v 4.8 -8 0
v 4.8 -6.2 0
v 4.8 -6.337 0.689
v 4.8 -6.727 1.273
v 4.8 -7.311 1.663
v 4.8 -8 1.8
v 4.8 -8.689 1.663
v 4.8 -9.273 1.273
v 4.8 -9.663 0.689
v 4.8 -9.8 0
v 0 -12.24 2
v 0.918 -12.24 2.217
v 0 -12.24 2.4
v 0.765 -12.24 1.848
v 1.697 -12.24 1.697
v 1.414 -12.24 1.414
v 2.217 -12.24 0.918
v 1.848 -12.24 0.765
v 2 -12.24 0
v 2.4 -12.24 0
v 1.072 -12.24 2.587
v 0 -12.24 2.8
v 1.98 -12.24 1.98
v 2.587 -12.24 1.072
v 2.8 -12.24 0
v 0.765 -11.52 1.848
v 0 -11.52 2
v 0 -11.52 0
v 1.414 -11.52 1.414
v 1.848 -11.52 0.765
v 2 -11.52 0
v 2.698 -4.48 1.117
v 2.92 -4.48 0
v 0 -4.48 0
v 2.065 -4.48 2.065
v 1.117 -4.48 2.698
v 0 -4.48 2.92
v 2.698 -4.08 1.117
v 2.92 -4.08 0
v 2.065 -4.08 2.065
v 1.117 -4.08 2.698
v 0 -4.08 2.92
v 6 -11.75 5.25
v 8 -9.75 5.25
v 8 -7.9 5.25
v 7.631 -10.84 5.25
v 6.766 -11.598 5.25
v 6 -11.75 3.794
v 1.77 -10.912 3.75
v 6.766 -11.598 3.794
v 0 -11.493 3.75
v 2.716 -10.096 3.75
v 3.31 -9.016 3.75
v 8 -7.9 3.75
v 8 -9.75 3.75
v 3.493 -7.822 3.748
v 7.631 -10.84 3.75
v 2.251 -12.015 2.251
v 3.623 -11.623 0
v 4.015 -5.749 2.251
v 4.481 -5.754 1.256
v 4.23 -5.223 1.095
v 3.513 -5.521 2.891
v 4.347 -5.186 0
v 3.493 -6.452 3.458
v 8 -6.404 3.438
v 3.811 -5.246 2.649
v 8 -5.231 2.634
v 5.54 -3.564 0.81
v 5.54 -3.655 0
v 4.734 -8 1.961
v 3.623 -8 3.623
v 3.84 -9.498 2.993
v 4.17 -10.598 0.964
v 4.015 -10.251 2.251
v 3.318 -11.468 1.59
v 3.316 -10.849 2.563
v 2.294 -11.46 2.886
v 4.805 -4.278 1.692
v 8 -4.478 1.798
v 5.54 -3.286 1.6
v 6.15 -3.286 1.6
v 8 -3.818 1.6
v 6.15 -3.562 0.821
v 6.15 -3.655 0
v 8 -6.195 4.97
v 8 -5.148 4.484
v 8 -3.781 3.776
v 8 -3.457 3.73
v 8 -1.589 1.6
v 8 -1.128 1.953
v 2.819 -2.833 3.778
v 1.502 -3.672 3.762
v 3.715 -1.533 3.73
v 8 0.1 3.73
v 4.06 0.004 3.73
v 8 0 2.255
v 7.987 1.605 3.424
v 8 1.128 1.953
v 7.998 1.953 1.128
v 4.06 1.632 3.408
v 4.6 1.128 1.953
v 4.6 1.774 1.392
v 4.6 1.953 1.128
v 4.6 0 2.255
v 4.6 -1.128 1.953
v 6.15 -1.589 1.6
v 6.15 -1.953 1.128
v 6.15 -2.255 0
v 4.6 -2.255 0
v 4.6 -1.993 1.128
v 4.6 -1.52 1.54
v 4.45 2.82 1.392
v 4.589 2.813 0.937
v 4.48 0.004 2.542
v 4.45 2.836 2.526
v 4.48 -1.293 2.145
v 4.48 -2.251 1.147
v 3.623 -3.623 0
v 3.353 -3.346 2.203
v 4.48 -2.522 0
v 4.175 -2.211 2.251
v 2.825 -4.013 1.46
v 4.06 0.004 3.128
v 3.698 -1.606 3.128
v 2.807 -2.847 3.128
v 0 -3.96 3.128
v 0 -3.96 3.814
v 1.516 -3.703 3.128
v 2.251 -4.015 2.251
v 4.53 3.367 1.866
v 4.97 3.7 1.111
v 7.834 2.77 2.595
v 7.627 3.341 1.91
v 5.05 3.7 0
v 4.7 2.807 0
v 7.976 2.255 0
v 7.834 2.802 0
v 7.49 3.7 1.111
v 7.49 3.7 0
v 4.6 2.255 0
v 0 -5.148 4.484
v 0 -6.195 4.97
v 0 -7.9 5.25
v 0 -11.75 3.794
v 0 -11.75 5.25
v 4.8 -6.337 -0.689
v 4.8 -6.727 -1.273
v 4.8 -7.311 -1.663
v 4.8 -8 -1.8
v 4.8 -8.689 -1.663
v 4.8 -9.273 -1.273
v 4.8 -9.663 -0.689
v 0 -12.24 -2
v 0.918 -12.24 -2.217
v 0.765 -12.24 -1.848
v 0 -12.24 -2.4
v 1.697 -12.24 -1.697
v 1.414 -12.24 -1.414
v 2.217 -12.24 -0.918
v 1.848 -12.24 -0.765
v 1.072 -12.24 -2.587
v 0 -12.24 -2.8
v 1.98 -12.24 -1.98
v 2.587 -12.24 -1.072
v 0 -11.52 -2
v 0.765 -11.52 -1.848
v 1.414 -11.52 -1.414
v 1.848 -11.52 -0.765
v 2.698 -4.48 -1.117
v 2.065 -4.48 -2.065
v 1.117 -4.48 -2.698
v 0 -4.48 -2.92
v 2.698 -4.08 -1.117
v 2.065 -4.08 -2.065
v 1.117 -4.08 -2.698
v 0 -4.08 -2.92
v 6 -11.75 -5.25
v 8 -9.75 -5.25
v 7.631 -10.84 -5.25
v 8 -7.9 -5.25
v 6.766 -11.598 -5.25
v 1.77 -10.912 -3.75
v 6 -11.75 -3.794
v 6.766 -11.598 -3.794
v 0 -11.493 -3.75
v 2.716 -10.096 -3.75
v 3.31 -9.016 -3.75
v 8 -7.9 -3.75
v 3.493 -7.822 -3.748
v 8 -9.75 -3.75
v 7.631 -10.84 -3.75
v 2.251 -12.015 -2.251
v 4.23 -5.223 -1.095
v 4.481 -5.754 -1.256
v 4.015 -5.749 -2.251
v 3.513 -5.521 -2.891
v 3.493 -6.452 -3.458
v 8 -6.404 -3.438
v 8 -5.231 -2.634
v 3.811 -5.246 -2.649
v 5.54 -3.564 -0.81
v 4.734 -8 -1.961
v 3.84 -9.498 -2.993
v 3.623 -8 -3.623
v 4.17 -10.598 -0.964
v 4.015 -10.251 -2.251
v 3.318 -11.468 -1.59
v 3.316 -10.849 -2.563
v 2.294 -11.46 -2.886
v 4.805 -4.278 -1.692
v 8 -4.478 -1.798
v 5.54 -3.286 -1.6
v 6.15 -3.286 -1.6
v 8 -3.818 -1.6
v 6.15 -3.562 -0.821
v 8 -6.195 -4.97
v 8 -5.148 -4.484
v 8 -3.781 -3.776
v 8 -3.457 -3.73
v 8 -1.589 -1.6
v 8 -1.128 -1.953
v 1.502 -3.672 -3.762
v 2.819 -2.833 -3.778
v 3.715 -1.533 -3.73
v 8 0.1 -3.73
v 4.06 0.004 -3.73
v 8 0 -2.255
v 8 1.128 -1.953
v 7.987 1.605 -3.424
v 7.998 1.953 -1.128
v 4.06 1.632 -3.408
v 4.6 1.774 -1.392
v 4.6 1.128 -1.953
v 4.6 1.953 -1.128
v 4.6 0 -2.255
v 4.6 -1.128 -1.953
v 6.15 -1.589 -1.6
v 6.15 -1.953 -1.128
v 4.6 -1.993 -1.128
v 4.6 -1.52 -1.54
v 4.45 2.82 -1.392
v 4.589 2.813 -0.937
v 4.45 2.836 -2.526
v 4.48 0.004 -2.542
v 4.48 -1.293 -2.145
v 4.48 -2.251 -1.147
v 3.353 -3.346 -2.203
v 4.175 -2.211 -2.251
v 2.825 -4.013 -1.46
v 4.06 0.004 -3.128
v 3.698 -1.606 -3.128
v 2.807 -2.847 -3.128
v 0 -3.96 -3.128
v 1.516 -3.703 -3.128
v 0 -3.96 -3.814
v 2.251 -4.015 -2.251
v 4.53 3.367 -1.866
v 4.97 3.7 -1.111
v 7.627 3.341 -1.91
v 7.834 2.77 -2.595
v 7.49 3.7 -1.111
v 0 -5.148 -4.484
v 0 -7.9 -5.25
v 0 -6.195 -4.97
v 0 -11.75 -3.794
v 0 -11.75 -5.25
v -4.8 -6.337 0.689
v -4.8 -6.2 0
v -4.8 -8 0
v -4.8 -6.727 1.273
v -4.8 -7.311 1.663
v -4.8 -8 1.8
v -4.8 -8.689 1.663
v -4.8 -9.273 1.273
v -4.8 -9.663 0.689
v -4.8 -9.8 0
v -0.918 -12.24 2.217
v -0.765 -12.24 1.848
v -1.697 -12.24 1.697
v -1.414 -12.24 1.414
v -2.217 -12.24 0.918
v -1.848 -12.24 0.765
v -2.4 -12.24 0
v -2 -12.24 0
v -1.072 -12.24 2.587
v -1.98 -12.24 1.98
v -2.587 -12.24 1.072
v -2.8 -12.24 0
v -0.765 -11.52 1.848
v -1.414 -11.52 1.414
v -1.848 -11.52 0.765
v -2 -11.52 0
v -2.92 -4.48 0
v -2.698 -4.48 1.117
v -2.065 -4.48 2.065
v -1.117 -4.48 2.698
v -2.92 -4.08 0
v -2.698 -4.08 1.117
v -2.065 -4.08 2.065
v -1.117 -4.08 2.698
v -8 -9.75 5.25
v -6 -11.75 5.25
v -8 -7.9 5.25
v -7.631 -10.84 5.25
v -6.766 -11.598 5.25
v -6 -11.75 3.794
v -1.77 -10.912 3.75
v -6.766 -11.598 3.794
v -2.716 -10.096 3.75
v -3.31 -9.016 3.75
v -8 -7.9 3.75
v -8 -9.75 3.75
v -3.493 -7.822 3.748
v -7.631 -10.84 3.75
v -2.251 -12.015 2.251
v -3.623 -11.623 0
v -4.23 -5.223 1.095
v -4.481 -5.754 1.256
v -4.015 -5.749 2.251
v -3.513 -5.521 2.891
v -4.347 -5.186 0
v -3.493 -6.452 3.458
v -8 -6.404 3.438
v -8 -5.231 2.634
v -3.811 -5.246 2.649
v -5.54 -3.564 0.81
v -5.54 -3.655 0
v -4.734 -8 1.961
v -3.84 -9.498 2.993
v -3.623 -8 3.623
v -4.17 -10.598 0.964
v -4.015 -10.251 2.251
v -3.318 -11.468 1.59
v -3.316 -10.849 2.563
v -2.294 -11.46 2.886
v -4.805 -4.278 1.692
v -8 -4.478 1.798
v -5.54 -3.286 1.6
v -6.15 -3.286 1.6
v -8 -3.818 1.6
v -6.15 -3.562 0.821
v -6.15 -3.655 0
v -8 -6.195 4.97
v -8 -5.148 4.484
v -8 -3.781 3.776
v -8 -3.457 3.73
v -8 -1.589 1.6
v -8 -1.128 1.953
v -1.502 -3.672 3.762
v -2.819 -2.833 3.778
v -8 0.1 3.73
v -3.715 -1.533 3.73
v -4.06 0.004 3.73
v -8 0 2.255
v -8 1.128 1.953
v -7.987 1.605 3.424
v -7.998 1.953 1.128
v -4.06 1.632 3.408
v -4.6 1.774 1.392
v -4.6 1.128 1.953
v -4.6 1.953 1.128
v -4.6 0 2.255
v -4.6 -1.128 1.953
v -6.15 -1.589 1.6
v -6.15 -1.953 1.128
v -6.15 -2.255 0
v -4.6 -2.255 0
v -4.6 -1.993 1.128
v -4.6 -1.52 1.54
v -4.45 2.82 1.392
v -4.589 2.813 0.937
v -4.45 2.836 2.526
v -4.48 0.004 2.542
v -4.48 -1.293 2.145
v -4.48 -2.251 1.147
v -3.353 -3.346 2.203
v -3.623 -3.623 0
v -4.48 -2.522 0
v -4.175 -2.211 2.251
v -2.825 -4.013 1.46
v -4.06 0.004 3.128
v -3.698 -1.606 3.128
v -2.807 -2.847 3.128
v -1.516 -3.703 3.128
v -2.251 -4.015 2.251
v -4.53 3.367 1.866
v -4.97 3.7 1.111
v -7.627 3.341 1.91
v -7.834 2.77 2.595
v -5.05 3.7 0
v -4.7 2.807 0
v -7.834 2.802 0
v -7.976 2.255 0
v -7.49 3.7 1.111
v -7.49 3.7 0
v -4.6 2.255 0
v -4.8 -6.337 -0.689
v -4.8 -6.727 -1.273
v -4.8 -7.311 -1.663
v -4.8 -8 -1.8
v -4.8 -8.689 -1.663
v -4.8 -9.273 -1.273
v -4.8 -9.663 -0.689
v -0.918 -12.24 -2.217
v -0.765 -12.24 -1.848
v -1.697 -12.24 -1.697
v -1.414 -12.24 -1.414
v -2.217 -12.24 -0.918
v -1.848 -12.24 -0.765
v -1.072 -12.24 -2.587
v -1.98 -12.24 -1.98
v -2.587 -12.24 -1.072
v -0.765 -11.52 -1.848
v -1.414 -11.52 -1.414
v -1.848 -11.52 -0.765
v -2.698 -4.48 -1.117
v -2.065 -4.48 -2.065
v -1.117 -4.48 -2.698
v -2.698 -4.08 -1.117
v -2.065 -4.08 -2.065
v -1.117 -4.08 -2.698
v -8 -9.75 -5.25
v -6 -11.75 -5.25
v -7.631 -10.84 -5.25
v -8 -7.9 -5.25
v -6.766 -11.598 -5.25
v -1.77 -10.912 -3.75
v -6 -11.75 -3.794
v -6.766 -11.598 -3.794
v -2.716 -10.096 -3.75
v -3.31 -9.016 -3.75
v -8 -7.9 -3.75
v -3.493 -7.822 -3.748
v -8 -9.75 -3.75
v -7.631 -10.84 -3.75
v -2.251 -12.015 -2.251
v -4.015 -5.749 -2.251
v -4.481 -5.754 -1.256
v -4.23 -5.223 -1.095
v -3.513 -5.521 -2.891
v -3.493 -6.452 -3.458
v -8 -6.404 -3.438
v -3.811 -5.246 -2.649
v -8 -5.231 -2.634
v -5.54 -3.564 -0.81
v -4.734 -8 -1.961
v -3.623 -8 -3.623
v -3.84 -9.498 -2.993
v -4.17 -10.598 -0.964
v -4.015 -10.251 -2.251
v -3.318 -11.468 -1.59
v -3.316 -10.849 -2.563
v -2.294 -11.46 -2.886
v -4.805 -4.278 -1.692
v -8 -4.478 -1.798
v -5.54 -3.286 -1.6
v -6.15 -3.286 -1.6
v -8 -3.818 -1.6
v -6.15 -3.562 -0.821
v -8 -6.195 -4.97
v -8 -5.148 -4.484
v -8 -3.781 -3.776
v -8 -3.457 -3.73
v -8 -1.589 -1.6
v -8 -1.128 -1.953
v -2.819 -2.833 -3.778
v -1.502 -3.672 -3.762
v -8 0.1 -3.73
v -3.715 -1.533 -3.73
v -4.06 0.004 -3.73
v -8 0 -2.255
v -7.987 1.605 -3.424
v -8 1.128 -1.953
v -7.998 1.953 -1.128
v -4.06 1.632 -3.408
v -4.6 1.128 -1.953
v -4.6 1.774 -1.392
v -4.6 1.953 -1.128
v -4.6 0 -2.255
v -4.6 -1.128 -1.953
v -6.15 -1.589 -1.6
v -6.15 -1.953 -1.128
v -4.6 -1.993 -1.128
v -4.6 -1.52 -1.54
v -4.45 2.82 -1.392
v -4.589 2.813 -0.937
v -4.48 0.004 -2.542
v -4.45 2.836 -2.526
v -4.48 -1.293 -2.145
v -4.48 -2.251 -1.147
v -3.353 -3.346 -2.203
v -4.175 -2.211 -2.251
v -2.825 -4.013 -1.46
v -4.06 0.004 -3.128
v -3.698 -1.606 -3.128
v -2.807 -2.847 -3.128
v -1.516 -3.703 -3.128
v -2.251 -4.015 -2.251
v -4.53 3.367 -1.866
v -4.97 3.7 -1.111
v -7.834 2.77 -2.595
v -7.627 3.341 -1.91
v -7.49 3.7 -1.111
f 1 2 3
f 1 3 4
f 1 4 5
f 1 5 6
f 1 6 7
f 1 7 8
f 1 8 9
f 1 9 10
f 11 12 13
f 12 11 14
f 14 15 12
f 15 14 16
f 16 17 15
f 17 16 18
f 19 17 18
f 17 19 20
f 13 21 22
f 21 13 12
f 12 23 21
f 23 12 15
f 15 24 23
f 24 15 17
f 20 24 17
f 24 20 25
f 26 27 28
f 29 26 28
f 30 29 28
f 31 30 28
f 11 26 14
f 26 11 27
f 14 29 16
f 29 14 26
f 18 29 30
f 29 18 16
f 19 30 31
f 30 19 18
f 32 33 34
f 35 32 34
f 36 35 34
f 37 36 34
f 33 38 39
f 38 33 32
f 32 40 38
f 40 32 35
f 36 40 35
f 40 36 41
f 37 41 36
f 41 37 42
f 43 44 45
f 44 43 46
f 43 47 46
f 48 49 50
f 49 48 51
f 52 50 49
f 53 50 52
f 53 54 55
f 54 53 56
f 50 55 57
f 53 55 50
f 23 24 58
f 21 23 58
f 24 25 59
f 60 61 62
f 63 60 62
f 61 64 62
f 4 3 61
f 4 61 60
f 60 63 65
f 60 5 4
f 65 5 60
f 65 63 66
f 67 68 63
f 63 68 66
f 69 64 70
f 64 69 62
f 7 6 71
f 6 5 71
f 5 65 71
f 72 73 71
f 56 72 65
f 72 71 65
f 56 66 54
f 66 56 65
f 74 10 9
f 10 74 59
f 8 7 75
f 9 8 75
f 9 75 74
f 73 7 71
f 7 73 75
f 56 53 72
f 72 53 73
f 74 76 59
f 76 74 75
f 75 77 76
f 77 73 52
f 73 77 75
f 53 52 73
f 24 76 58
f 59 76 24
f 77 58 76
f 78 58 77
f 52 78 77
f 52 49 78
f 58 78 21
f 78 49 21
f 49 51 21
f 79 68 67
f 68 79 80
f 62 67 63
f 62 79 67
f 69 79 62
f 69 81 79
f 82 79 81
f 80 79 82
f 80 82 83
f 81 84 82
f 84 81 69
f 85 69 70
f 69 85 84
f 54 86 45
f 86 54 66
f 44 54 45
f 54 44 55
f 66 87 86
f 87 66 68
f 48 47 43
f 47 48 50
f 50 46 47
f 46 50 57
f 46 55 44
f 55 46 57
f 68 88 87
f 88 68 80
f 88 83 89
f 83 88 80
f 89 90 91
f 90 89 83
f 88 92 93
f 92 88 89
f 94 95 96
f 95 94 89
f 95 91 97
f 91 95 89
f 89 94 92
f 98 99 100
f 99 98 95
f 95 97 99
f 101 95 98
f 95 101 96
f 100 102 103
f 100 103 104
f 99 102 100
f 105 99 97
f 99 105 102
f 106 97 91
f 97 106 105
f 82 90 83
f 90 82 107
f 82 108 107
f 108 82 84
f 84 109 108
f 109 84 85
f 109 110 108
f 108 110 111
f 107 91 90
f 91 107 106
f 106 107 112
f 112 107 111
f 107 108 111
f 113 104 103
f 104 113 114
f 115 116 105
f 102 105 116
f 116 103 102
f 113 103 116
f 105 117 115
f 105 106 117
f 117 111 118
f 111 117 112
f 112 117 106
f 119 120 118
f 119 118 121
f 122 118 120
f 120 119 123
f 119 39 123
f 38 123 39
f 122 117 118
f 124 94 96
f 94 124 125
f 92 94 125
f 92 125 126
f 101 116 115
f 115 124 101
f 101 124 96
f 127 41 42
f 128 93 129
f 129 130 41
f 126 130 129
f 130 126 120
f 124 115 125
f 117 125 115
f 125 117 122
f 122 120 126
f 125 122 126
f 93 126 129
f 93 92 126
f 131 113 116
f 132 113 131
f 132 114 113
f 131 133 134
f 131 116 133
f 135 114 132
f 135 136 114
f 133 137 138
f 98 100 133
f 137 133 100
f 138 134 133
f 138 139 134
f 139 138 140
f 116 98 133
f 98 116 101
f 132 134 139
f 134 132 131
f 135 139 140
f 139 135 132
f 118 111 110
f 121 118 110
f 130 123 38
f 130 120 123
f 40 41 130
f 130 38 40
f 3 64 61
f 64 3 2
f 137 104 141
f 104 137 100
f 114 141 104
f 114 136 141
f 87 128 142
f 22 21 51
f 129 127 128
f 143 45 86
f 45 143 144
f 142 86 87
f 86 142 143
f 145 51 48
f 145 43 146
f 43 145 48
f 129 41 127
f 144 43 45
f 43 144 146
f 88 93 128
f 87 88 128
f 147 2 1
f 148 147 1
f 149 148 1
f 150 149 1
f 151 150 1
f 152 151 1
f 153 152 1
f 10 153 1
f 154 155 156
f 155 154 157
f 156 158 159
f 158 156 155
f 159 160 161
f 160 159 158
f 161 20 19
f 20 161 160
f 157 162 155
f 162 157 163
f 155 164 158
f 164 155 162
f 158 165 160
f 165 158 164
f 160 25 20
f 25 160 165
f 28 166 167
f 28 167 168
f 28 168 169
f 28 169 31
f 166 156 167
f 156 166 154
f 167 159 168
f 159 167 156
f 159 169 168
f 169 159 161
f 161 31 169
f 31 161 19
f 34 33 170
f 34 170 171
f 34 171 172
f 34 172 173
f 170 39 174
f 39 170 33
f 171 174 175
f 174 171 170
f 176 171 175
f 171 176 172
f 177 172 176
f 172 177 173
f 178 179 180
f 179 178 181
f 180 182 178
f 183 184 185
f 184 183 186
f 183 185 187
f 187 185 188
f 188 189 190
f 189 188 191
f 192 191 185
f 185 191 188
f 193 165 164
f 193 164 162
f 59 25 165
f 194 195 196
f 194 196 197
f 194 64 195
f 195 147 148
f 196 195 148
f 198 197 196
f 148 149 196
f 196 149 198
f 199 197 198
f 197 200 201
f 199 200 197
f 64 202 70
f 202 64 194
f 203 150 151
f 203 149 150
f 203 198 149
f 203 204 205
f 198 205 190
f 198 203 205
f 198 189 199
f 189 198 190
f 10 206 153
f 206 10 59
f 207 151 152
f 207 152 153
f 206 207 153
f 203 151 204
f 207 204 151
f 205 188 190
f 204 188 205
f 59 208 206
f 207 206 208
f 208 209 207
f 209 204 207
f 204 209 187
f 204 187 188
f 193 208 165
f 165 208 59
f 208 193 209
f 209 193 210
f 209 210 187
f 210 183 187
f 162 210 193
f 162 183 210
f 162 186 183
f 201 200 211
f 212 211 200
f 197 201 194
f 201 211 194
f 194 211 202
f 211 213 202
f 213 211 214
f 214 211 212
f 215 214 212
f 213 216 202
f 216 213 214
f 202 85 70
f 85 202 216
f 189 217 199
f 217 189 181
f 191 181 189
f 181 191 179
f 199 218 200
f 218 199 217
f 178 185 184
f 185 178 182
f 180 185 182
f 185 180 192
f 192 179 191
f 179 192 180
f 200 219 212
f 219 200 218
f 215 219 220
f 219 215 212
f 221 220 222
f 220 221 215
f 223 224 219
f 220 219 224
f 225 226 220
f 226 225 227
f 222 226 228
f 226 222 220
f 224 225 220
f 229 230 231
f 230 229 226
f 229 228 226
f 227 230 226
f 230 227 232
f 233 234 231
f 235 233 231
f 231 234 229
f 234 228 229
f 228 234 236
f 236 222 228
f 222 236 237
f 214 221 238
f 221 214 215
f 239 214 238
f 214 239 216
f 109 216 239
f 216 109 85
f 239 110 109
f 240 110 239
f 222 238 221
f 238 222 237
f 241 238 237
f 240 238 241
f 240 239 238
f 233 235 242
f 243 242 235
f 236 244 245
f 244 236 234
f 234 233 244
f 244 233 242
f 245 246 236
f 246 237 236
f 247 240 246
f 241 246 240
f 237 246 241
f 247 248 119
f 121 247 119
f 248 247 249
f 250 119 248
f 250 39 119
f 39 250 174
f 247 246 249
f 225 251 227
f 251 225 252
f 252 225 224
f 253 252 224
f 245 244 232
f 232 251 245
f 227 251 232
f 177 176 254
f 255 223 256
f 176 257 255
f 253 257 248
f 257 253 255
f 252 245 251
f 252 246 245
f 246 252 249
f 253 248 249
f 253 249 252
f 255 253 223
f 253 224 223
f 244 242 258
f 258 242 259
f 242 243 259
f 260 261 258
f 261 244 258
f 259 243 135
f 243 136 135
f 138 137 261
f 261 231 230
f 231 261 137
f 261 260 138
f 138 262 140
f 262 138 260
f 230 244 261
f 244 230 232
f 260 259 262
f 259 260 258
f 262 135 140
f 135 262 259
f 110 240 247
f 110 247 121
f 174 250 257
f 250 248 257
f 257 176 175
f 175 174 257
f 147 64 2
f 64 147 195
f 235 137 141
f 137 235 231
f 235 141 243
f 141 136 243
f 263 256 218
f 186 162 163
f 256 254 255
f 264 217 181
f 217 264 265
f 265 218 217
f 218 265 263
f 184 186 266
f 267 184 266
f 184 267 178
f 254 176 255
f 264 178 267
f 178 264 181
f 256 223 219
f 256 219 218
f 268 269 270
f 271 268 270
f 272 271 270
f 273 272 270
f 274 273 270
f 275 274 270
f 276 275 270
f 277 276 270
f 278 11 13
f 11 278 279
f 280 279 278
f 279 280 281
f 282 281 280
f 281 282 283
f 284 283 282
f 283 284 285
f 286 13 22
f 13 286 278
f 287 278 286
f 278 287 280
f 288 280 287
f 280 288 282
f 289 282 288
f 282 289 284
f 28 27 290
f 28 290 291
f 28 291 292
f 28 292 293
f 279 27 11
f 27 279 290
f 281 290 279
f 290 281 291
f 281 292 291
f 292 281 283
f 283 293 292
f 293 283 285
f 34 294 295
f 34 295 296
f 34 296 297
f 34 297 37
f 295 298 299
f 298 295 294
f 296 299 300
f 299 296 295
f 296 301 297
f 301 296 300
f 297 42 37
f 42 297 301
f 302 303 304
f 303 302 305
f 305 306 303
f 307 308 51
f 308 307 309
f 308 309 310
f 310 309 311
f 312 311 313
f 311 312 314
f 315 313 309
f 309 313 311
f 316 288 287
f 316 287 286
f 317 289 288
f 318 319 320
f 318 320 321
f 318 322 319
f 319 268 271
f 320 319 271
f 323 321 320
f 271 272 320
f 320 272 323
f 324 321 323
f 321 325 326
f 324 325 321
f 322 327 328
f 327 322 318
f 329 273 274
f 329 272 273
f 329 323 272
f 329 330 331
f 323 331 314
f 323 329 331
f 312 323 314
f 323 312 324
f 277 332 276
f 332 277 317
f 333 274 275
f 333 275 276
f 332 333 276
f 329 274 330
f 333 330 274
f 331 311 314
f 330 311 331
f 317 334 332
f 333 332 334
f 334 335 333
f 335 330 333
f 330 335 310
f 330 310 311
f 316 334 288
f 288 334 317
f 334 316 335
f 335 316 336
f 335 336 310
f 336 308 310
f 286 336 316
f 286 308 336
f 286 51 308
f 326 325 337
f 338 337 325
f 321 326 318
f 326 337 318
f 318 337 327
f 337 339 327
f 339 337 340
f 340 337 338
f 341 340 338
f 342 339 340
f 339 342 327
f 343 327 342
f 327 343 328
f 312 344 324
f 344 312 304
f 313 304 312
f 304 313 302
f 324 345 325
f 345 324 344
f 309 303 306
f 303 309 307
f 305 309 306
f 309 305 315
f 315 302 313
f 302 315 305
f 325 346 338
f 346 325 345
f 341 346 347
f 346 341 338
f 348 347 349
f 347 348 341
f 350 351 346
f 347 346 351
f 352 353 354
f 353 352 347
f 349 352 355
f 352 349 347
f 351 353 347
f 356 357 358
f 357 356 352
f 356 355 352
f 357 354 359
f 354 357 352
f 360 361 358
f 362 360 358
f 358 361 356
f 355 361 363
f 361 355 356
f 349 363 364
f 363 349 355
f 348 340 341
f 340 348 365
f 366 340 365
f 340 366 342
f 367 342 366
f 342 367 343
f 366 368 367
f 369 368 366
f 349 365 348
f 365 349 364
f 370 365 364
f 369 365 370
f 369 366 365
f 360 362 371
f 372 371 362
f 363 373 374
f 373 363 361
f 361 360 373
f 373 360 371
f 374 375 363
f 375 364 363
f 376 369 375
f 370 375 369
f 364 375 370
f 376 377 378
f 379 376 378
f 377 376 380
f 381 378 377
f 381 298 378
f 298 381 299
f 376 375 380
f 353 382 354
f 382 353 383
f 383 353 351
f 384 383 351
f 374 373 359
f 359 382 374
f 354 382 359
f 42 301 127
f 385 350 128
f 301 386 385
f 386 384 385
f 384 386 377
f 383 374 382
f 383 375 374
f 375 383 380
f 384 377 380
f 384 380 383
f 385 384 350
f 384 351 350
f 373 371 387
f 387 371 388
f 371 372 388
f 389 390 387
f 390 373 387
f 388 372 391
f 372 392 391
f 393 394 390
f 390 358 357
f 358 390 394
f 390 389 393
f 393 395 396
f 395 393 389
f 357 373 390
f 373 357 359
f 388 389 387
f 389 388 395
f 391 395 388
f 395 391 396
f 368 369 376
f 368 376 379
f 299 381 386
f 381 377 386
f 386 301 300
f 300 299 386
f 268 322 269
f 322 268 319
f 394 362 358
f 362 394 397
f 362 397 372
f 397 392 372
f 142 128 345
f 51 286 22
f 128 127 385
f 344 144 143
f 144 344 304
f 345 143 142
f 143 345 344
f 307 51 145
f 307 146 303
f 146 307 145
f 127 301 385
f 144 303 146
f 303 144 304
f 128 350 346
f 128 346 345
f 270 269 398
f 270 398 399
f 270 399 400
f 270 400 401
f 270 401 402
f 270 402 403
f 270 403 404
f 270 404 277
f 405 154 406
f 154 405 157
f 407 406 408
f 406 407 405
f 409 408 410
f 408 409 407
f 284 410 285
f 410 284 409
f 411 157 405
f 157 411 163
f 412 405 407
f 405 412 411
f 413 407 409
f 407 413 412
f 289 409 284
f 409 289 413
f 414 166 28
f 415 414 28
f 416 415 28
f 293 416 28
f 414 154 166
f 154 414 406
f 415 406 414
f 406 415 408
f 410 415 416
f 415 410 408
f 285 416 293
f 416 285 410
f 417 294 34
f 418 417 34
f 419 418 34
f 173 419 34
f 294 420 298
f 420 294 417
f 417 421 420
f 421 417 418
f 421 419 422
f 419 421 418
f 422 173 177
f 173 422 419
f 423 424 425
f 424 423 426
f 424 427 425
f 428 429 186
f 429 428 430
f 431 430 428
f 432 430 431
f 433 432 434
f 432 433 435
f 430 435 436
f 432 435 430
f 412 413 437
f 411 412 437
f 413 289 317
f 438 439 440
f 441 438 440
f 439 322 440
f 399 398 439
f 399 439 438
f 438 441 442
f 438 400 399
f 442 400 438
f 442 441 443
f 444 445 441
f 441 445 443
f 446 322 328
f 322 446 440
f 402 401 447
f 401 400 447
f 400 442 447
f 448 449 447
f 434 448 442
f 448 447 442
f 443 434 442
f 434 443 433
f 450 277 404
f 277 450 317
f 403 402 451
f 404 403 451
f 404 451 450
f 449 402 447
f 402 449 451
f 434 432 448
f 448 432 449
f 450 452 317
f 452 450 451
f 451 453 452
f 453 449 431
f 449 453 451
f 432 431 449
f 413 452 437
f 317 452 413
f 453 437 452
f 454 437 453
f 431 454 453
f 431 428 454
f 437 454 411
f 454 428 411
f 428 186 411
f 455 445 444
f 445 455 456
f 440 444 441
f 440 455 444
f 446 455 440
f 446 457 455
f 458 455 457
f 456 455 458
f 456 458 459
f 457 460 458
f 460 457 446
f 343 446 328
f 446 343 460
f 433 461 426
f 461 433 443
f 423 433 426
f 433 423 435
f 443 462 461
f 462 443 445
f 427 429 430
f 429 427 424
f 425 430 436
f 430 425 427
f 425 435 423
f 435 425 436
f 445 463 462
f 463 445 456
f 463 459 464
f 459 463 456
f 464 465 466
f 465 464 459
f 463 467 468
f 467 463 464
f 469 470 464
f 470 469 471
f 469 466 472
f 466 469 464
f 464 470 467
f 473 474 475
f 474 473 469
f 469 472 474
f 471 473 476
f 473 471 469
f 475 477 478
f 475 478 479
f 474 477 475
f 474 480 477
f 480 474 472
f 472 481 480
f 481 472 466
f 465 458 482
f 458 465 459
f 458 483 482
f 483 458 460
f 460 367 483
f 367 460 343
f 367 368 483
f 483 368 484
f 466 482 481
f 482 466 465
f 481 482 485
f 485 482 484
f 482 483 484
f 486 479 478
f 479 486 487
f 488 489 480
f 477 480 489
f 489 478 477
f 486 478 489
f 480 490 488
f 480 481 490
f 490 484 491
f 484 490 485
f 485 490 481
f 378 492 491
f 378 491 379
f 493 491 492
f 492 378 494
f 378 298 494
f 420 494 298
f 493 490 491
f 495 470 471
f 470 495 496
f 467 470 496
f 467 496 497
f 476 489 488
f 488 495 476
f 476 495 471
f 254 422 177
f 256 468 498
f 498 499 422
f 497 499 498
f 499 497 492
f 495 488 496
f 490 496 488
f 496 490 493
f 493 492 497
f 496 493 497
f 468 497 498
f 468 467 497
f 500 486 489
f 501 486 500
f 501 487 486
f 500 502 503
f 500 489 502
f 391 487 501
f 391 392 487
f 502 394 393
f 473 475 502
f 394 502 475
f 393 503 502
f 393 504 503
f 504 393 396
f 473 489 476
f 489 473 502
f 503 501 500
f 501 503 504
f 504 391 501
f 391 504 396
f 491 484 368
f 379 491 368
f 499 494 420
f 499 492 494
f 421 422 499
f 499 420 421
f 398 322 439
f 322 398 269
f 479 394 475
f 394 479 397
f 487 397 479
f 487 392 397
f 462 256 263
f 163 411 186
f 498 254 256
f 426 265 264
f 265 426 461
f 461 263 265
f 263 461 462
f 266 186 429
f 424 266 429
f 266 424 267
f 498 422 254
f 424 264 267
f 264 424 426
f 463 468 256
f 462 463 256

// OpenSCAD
use <../lib.scad>
use <s/98613s01.scad>
$fa=1; $fs=0.2;
function ldraw_lib__98613(realsolid=false) = [
// 0 ~Constraction Limb  2 Extender without Rubber Inlay
// 0 Name: 98613.dat
// 0 Author: Magnus Forsberg [MagFors]
// 0 !LDRAW_ORG Part UPDATE 2018-02
// 0 !LICENSE Licensed under CC BY 2.0 and CC BY 4.0 : see CAreadme.txt
// 
// 0 BFC CERTIFY CCW
  [0,"BFC","CERTIFY"],
  [0,"BFC","CCW"],
// 
// 0 !HISTORY 2013-08-14 {LEGO Digital Designer} Original part shape
// 0 !HISTORY 2016-04-07 [MagFors] File preparation for LDraw Parts Tracker
// 0 !HISTORY 2018-12-08 [PTadmin] Official Update 2018-02
// 
// 
// 1 16 0 0 0 1 0 0 0 1 0 0 0 1 s\98613s01.dat
  [1,16,0,0,0,1,0,0,0,1,0,0,0,1, ldraw_lib__s__98613s01(realsolid)],
// 1 16 0 0 0 1 0 0 0 -1 0 0 0 1 s\98613s01.dat
  [1,16,0,0,0,1,0,0,0,-1,0,0,0,1, ldraw_lib__s__98613s01(realsolid)],
// 1 16 0 0 0 -1 0 0 0 1 0 0 0 1 s\98613s01.dat
  [1,16,0,0,0,-1,0,0,0,1,0,0,0,1, ldraw_lib__s__98613s01(realsolid)],
// 1 16 0 0 0 -1 0 0 0 -1 0 0 0 1 s\98613s01.dat
  [1,16,0,0,0,-1,0,0,0,-1,0,0,0,1, ldraw_lib__s__98613s01(realsolid)],
];
module ldraw_lib__98613(step=0, col=false, unit=2/5, alt=false, line=0.2, solid=!$preview)
    makepoly(ldraw_lib__98613(solid), step=step, col=col, unit=unit, alt=alt, line=line, solid=solid);
ldraw_lib__98613(line=0.2);
